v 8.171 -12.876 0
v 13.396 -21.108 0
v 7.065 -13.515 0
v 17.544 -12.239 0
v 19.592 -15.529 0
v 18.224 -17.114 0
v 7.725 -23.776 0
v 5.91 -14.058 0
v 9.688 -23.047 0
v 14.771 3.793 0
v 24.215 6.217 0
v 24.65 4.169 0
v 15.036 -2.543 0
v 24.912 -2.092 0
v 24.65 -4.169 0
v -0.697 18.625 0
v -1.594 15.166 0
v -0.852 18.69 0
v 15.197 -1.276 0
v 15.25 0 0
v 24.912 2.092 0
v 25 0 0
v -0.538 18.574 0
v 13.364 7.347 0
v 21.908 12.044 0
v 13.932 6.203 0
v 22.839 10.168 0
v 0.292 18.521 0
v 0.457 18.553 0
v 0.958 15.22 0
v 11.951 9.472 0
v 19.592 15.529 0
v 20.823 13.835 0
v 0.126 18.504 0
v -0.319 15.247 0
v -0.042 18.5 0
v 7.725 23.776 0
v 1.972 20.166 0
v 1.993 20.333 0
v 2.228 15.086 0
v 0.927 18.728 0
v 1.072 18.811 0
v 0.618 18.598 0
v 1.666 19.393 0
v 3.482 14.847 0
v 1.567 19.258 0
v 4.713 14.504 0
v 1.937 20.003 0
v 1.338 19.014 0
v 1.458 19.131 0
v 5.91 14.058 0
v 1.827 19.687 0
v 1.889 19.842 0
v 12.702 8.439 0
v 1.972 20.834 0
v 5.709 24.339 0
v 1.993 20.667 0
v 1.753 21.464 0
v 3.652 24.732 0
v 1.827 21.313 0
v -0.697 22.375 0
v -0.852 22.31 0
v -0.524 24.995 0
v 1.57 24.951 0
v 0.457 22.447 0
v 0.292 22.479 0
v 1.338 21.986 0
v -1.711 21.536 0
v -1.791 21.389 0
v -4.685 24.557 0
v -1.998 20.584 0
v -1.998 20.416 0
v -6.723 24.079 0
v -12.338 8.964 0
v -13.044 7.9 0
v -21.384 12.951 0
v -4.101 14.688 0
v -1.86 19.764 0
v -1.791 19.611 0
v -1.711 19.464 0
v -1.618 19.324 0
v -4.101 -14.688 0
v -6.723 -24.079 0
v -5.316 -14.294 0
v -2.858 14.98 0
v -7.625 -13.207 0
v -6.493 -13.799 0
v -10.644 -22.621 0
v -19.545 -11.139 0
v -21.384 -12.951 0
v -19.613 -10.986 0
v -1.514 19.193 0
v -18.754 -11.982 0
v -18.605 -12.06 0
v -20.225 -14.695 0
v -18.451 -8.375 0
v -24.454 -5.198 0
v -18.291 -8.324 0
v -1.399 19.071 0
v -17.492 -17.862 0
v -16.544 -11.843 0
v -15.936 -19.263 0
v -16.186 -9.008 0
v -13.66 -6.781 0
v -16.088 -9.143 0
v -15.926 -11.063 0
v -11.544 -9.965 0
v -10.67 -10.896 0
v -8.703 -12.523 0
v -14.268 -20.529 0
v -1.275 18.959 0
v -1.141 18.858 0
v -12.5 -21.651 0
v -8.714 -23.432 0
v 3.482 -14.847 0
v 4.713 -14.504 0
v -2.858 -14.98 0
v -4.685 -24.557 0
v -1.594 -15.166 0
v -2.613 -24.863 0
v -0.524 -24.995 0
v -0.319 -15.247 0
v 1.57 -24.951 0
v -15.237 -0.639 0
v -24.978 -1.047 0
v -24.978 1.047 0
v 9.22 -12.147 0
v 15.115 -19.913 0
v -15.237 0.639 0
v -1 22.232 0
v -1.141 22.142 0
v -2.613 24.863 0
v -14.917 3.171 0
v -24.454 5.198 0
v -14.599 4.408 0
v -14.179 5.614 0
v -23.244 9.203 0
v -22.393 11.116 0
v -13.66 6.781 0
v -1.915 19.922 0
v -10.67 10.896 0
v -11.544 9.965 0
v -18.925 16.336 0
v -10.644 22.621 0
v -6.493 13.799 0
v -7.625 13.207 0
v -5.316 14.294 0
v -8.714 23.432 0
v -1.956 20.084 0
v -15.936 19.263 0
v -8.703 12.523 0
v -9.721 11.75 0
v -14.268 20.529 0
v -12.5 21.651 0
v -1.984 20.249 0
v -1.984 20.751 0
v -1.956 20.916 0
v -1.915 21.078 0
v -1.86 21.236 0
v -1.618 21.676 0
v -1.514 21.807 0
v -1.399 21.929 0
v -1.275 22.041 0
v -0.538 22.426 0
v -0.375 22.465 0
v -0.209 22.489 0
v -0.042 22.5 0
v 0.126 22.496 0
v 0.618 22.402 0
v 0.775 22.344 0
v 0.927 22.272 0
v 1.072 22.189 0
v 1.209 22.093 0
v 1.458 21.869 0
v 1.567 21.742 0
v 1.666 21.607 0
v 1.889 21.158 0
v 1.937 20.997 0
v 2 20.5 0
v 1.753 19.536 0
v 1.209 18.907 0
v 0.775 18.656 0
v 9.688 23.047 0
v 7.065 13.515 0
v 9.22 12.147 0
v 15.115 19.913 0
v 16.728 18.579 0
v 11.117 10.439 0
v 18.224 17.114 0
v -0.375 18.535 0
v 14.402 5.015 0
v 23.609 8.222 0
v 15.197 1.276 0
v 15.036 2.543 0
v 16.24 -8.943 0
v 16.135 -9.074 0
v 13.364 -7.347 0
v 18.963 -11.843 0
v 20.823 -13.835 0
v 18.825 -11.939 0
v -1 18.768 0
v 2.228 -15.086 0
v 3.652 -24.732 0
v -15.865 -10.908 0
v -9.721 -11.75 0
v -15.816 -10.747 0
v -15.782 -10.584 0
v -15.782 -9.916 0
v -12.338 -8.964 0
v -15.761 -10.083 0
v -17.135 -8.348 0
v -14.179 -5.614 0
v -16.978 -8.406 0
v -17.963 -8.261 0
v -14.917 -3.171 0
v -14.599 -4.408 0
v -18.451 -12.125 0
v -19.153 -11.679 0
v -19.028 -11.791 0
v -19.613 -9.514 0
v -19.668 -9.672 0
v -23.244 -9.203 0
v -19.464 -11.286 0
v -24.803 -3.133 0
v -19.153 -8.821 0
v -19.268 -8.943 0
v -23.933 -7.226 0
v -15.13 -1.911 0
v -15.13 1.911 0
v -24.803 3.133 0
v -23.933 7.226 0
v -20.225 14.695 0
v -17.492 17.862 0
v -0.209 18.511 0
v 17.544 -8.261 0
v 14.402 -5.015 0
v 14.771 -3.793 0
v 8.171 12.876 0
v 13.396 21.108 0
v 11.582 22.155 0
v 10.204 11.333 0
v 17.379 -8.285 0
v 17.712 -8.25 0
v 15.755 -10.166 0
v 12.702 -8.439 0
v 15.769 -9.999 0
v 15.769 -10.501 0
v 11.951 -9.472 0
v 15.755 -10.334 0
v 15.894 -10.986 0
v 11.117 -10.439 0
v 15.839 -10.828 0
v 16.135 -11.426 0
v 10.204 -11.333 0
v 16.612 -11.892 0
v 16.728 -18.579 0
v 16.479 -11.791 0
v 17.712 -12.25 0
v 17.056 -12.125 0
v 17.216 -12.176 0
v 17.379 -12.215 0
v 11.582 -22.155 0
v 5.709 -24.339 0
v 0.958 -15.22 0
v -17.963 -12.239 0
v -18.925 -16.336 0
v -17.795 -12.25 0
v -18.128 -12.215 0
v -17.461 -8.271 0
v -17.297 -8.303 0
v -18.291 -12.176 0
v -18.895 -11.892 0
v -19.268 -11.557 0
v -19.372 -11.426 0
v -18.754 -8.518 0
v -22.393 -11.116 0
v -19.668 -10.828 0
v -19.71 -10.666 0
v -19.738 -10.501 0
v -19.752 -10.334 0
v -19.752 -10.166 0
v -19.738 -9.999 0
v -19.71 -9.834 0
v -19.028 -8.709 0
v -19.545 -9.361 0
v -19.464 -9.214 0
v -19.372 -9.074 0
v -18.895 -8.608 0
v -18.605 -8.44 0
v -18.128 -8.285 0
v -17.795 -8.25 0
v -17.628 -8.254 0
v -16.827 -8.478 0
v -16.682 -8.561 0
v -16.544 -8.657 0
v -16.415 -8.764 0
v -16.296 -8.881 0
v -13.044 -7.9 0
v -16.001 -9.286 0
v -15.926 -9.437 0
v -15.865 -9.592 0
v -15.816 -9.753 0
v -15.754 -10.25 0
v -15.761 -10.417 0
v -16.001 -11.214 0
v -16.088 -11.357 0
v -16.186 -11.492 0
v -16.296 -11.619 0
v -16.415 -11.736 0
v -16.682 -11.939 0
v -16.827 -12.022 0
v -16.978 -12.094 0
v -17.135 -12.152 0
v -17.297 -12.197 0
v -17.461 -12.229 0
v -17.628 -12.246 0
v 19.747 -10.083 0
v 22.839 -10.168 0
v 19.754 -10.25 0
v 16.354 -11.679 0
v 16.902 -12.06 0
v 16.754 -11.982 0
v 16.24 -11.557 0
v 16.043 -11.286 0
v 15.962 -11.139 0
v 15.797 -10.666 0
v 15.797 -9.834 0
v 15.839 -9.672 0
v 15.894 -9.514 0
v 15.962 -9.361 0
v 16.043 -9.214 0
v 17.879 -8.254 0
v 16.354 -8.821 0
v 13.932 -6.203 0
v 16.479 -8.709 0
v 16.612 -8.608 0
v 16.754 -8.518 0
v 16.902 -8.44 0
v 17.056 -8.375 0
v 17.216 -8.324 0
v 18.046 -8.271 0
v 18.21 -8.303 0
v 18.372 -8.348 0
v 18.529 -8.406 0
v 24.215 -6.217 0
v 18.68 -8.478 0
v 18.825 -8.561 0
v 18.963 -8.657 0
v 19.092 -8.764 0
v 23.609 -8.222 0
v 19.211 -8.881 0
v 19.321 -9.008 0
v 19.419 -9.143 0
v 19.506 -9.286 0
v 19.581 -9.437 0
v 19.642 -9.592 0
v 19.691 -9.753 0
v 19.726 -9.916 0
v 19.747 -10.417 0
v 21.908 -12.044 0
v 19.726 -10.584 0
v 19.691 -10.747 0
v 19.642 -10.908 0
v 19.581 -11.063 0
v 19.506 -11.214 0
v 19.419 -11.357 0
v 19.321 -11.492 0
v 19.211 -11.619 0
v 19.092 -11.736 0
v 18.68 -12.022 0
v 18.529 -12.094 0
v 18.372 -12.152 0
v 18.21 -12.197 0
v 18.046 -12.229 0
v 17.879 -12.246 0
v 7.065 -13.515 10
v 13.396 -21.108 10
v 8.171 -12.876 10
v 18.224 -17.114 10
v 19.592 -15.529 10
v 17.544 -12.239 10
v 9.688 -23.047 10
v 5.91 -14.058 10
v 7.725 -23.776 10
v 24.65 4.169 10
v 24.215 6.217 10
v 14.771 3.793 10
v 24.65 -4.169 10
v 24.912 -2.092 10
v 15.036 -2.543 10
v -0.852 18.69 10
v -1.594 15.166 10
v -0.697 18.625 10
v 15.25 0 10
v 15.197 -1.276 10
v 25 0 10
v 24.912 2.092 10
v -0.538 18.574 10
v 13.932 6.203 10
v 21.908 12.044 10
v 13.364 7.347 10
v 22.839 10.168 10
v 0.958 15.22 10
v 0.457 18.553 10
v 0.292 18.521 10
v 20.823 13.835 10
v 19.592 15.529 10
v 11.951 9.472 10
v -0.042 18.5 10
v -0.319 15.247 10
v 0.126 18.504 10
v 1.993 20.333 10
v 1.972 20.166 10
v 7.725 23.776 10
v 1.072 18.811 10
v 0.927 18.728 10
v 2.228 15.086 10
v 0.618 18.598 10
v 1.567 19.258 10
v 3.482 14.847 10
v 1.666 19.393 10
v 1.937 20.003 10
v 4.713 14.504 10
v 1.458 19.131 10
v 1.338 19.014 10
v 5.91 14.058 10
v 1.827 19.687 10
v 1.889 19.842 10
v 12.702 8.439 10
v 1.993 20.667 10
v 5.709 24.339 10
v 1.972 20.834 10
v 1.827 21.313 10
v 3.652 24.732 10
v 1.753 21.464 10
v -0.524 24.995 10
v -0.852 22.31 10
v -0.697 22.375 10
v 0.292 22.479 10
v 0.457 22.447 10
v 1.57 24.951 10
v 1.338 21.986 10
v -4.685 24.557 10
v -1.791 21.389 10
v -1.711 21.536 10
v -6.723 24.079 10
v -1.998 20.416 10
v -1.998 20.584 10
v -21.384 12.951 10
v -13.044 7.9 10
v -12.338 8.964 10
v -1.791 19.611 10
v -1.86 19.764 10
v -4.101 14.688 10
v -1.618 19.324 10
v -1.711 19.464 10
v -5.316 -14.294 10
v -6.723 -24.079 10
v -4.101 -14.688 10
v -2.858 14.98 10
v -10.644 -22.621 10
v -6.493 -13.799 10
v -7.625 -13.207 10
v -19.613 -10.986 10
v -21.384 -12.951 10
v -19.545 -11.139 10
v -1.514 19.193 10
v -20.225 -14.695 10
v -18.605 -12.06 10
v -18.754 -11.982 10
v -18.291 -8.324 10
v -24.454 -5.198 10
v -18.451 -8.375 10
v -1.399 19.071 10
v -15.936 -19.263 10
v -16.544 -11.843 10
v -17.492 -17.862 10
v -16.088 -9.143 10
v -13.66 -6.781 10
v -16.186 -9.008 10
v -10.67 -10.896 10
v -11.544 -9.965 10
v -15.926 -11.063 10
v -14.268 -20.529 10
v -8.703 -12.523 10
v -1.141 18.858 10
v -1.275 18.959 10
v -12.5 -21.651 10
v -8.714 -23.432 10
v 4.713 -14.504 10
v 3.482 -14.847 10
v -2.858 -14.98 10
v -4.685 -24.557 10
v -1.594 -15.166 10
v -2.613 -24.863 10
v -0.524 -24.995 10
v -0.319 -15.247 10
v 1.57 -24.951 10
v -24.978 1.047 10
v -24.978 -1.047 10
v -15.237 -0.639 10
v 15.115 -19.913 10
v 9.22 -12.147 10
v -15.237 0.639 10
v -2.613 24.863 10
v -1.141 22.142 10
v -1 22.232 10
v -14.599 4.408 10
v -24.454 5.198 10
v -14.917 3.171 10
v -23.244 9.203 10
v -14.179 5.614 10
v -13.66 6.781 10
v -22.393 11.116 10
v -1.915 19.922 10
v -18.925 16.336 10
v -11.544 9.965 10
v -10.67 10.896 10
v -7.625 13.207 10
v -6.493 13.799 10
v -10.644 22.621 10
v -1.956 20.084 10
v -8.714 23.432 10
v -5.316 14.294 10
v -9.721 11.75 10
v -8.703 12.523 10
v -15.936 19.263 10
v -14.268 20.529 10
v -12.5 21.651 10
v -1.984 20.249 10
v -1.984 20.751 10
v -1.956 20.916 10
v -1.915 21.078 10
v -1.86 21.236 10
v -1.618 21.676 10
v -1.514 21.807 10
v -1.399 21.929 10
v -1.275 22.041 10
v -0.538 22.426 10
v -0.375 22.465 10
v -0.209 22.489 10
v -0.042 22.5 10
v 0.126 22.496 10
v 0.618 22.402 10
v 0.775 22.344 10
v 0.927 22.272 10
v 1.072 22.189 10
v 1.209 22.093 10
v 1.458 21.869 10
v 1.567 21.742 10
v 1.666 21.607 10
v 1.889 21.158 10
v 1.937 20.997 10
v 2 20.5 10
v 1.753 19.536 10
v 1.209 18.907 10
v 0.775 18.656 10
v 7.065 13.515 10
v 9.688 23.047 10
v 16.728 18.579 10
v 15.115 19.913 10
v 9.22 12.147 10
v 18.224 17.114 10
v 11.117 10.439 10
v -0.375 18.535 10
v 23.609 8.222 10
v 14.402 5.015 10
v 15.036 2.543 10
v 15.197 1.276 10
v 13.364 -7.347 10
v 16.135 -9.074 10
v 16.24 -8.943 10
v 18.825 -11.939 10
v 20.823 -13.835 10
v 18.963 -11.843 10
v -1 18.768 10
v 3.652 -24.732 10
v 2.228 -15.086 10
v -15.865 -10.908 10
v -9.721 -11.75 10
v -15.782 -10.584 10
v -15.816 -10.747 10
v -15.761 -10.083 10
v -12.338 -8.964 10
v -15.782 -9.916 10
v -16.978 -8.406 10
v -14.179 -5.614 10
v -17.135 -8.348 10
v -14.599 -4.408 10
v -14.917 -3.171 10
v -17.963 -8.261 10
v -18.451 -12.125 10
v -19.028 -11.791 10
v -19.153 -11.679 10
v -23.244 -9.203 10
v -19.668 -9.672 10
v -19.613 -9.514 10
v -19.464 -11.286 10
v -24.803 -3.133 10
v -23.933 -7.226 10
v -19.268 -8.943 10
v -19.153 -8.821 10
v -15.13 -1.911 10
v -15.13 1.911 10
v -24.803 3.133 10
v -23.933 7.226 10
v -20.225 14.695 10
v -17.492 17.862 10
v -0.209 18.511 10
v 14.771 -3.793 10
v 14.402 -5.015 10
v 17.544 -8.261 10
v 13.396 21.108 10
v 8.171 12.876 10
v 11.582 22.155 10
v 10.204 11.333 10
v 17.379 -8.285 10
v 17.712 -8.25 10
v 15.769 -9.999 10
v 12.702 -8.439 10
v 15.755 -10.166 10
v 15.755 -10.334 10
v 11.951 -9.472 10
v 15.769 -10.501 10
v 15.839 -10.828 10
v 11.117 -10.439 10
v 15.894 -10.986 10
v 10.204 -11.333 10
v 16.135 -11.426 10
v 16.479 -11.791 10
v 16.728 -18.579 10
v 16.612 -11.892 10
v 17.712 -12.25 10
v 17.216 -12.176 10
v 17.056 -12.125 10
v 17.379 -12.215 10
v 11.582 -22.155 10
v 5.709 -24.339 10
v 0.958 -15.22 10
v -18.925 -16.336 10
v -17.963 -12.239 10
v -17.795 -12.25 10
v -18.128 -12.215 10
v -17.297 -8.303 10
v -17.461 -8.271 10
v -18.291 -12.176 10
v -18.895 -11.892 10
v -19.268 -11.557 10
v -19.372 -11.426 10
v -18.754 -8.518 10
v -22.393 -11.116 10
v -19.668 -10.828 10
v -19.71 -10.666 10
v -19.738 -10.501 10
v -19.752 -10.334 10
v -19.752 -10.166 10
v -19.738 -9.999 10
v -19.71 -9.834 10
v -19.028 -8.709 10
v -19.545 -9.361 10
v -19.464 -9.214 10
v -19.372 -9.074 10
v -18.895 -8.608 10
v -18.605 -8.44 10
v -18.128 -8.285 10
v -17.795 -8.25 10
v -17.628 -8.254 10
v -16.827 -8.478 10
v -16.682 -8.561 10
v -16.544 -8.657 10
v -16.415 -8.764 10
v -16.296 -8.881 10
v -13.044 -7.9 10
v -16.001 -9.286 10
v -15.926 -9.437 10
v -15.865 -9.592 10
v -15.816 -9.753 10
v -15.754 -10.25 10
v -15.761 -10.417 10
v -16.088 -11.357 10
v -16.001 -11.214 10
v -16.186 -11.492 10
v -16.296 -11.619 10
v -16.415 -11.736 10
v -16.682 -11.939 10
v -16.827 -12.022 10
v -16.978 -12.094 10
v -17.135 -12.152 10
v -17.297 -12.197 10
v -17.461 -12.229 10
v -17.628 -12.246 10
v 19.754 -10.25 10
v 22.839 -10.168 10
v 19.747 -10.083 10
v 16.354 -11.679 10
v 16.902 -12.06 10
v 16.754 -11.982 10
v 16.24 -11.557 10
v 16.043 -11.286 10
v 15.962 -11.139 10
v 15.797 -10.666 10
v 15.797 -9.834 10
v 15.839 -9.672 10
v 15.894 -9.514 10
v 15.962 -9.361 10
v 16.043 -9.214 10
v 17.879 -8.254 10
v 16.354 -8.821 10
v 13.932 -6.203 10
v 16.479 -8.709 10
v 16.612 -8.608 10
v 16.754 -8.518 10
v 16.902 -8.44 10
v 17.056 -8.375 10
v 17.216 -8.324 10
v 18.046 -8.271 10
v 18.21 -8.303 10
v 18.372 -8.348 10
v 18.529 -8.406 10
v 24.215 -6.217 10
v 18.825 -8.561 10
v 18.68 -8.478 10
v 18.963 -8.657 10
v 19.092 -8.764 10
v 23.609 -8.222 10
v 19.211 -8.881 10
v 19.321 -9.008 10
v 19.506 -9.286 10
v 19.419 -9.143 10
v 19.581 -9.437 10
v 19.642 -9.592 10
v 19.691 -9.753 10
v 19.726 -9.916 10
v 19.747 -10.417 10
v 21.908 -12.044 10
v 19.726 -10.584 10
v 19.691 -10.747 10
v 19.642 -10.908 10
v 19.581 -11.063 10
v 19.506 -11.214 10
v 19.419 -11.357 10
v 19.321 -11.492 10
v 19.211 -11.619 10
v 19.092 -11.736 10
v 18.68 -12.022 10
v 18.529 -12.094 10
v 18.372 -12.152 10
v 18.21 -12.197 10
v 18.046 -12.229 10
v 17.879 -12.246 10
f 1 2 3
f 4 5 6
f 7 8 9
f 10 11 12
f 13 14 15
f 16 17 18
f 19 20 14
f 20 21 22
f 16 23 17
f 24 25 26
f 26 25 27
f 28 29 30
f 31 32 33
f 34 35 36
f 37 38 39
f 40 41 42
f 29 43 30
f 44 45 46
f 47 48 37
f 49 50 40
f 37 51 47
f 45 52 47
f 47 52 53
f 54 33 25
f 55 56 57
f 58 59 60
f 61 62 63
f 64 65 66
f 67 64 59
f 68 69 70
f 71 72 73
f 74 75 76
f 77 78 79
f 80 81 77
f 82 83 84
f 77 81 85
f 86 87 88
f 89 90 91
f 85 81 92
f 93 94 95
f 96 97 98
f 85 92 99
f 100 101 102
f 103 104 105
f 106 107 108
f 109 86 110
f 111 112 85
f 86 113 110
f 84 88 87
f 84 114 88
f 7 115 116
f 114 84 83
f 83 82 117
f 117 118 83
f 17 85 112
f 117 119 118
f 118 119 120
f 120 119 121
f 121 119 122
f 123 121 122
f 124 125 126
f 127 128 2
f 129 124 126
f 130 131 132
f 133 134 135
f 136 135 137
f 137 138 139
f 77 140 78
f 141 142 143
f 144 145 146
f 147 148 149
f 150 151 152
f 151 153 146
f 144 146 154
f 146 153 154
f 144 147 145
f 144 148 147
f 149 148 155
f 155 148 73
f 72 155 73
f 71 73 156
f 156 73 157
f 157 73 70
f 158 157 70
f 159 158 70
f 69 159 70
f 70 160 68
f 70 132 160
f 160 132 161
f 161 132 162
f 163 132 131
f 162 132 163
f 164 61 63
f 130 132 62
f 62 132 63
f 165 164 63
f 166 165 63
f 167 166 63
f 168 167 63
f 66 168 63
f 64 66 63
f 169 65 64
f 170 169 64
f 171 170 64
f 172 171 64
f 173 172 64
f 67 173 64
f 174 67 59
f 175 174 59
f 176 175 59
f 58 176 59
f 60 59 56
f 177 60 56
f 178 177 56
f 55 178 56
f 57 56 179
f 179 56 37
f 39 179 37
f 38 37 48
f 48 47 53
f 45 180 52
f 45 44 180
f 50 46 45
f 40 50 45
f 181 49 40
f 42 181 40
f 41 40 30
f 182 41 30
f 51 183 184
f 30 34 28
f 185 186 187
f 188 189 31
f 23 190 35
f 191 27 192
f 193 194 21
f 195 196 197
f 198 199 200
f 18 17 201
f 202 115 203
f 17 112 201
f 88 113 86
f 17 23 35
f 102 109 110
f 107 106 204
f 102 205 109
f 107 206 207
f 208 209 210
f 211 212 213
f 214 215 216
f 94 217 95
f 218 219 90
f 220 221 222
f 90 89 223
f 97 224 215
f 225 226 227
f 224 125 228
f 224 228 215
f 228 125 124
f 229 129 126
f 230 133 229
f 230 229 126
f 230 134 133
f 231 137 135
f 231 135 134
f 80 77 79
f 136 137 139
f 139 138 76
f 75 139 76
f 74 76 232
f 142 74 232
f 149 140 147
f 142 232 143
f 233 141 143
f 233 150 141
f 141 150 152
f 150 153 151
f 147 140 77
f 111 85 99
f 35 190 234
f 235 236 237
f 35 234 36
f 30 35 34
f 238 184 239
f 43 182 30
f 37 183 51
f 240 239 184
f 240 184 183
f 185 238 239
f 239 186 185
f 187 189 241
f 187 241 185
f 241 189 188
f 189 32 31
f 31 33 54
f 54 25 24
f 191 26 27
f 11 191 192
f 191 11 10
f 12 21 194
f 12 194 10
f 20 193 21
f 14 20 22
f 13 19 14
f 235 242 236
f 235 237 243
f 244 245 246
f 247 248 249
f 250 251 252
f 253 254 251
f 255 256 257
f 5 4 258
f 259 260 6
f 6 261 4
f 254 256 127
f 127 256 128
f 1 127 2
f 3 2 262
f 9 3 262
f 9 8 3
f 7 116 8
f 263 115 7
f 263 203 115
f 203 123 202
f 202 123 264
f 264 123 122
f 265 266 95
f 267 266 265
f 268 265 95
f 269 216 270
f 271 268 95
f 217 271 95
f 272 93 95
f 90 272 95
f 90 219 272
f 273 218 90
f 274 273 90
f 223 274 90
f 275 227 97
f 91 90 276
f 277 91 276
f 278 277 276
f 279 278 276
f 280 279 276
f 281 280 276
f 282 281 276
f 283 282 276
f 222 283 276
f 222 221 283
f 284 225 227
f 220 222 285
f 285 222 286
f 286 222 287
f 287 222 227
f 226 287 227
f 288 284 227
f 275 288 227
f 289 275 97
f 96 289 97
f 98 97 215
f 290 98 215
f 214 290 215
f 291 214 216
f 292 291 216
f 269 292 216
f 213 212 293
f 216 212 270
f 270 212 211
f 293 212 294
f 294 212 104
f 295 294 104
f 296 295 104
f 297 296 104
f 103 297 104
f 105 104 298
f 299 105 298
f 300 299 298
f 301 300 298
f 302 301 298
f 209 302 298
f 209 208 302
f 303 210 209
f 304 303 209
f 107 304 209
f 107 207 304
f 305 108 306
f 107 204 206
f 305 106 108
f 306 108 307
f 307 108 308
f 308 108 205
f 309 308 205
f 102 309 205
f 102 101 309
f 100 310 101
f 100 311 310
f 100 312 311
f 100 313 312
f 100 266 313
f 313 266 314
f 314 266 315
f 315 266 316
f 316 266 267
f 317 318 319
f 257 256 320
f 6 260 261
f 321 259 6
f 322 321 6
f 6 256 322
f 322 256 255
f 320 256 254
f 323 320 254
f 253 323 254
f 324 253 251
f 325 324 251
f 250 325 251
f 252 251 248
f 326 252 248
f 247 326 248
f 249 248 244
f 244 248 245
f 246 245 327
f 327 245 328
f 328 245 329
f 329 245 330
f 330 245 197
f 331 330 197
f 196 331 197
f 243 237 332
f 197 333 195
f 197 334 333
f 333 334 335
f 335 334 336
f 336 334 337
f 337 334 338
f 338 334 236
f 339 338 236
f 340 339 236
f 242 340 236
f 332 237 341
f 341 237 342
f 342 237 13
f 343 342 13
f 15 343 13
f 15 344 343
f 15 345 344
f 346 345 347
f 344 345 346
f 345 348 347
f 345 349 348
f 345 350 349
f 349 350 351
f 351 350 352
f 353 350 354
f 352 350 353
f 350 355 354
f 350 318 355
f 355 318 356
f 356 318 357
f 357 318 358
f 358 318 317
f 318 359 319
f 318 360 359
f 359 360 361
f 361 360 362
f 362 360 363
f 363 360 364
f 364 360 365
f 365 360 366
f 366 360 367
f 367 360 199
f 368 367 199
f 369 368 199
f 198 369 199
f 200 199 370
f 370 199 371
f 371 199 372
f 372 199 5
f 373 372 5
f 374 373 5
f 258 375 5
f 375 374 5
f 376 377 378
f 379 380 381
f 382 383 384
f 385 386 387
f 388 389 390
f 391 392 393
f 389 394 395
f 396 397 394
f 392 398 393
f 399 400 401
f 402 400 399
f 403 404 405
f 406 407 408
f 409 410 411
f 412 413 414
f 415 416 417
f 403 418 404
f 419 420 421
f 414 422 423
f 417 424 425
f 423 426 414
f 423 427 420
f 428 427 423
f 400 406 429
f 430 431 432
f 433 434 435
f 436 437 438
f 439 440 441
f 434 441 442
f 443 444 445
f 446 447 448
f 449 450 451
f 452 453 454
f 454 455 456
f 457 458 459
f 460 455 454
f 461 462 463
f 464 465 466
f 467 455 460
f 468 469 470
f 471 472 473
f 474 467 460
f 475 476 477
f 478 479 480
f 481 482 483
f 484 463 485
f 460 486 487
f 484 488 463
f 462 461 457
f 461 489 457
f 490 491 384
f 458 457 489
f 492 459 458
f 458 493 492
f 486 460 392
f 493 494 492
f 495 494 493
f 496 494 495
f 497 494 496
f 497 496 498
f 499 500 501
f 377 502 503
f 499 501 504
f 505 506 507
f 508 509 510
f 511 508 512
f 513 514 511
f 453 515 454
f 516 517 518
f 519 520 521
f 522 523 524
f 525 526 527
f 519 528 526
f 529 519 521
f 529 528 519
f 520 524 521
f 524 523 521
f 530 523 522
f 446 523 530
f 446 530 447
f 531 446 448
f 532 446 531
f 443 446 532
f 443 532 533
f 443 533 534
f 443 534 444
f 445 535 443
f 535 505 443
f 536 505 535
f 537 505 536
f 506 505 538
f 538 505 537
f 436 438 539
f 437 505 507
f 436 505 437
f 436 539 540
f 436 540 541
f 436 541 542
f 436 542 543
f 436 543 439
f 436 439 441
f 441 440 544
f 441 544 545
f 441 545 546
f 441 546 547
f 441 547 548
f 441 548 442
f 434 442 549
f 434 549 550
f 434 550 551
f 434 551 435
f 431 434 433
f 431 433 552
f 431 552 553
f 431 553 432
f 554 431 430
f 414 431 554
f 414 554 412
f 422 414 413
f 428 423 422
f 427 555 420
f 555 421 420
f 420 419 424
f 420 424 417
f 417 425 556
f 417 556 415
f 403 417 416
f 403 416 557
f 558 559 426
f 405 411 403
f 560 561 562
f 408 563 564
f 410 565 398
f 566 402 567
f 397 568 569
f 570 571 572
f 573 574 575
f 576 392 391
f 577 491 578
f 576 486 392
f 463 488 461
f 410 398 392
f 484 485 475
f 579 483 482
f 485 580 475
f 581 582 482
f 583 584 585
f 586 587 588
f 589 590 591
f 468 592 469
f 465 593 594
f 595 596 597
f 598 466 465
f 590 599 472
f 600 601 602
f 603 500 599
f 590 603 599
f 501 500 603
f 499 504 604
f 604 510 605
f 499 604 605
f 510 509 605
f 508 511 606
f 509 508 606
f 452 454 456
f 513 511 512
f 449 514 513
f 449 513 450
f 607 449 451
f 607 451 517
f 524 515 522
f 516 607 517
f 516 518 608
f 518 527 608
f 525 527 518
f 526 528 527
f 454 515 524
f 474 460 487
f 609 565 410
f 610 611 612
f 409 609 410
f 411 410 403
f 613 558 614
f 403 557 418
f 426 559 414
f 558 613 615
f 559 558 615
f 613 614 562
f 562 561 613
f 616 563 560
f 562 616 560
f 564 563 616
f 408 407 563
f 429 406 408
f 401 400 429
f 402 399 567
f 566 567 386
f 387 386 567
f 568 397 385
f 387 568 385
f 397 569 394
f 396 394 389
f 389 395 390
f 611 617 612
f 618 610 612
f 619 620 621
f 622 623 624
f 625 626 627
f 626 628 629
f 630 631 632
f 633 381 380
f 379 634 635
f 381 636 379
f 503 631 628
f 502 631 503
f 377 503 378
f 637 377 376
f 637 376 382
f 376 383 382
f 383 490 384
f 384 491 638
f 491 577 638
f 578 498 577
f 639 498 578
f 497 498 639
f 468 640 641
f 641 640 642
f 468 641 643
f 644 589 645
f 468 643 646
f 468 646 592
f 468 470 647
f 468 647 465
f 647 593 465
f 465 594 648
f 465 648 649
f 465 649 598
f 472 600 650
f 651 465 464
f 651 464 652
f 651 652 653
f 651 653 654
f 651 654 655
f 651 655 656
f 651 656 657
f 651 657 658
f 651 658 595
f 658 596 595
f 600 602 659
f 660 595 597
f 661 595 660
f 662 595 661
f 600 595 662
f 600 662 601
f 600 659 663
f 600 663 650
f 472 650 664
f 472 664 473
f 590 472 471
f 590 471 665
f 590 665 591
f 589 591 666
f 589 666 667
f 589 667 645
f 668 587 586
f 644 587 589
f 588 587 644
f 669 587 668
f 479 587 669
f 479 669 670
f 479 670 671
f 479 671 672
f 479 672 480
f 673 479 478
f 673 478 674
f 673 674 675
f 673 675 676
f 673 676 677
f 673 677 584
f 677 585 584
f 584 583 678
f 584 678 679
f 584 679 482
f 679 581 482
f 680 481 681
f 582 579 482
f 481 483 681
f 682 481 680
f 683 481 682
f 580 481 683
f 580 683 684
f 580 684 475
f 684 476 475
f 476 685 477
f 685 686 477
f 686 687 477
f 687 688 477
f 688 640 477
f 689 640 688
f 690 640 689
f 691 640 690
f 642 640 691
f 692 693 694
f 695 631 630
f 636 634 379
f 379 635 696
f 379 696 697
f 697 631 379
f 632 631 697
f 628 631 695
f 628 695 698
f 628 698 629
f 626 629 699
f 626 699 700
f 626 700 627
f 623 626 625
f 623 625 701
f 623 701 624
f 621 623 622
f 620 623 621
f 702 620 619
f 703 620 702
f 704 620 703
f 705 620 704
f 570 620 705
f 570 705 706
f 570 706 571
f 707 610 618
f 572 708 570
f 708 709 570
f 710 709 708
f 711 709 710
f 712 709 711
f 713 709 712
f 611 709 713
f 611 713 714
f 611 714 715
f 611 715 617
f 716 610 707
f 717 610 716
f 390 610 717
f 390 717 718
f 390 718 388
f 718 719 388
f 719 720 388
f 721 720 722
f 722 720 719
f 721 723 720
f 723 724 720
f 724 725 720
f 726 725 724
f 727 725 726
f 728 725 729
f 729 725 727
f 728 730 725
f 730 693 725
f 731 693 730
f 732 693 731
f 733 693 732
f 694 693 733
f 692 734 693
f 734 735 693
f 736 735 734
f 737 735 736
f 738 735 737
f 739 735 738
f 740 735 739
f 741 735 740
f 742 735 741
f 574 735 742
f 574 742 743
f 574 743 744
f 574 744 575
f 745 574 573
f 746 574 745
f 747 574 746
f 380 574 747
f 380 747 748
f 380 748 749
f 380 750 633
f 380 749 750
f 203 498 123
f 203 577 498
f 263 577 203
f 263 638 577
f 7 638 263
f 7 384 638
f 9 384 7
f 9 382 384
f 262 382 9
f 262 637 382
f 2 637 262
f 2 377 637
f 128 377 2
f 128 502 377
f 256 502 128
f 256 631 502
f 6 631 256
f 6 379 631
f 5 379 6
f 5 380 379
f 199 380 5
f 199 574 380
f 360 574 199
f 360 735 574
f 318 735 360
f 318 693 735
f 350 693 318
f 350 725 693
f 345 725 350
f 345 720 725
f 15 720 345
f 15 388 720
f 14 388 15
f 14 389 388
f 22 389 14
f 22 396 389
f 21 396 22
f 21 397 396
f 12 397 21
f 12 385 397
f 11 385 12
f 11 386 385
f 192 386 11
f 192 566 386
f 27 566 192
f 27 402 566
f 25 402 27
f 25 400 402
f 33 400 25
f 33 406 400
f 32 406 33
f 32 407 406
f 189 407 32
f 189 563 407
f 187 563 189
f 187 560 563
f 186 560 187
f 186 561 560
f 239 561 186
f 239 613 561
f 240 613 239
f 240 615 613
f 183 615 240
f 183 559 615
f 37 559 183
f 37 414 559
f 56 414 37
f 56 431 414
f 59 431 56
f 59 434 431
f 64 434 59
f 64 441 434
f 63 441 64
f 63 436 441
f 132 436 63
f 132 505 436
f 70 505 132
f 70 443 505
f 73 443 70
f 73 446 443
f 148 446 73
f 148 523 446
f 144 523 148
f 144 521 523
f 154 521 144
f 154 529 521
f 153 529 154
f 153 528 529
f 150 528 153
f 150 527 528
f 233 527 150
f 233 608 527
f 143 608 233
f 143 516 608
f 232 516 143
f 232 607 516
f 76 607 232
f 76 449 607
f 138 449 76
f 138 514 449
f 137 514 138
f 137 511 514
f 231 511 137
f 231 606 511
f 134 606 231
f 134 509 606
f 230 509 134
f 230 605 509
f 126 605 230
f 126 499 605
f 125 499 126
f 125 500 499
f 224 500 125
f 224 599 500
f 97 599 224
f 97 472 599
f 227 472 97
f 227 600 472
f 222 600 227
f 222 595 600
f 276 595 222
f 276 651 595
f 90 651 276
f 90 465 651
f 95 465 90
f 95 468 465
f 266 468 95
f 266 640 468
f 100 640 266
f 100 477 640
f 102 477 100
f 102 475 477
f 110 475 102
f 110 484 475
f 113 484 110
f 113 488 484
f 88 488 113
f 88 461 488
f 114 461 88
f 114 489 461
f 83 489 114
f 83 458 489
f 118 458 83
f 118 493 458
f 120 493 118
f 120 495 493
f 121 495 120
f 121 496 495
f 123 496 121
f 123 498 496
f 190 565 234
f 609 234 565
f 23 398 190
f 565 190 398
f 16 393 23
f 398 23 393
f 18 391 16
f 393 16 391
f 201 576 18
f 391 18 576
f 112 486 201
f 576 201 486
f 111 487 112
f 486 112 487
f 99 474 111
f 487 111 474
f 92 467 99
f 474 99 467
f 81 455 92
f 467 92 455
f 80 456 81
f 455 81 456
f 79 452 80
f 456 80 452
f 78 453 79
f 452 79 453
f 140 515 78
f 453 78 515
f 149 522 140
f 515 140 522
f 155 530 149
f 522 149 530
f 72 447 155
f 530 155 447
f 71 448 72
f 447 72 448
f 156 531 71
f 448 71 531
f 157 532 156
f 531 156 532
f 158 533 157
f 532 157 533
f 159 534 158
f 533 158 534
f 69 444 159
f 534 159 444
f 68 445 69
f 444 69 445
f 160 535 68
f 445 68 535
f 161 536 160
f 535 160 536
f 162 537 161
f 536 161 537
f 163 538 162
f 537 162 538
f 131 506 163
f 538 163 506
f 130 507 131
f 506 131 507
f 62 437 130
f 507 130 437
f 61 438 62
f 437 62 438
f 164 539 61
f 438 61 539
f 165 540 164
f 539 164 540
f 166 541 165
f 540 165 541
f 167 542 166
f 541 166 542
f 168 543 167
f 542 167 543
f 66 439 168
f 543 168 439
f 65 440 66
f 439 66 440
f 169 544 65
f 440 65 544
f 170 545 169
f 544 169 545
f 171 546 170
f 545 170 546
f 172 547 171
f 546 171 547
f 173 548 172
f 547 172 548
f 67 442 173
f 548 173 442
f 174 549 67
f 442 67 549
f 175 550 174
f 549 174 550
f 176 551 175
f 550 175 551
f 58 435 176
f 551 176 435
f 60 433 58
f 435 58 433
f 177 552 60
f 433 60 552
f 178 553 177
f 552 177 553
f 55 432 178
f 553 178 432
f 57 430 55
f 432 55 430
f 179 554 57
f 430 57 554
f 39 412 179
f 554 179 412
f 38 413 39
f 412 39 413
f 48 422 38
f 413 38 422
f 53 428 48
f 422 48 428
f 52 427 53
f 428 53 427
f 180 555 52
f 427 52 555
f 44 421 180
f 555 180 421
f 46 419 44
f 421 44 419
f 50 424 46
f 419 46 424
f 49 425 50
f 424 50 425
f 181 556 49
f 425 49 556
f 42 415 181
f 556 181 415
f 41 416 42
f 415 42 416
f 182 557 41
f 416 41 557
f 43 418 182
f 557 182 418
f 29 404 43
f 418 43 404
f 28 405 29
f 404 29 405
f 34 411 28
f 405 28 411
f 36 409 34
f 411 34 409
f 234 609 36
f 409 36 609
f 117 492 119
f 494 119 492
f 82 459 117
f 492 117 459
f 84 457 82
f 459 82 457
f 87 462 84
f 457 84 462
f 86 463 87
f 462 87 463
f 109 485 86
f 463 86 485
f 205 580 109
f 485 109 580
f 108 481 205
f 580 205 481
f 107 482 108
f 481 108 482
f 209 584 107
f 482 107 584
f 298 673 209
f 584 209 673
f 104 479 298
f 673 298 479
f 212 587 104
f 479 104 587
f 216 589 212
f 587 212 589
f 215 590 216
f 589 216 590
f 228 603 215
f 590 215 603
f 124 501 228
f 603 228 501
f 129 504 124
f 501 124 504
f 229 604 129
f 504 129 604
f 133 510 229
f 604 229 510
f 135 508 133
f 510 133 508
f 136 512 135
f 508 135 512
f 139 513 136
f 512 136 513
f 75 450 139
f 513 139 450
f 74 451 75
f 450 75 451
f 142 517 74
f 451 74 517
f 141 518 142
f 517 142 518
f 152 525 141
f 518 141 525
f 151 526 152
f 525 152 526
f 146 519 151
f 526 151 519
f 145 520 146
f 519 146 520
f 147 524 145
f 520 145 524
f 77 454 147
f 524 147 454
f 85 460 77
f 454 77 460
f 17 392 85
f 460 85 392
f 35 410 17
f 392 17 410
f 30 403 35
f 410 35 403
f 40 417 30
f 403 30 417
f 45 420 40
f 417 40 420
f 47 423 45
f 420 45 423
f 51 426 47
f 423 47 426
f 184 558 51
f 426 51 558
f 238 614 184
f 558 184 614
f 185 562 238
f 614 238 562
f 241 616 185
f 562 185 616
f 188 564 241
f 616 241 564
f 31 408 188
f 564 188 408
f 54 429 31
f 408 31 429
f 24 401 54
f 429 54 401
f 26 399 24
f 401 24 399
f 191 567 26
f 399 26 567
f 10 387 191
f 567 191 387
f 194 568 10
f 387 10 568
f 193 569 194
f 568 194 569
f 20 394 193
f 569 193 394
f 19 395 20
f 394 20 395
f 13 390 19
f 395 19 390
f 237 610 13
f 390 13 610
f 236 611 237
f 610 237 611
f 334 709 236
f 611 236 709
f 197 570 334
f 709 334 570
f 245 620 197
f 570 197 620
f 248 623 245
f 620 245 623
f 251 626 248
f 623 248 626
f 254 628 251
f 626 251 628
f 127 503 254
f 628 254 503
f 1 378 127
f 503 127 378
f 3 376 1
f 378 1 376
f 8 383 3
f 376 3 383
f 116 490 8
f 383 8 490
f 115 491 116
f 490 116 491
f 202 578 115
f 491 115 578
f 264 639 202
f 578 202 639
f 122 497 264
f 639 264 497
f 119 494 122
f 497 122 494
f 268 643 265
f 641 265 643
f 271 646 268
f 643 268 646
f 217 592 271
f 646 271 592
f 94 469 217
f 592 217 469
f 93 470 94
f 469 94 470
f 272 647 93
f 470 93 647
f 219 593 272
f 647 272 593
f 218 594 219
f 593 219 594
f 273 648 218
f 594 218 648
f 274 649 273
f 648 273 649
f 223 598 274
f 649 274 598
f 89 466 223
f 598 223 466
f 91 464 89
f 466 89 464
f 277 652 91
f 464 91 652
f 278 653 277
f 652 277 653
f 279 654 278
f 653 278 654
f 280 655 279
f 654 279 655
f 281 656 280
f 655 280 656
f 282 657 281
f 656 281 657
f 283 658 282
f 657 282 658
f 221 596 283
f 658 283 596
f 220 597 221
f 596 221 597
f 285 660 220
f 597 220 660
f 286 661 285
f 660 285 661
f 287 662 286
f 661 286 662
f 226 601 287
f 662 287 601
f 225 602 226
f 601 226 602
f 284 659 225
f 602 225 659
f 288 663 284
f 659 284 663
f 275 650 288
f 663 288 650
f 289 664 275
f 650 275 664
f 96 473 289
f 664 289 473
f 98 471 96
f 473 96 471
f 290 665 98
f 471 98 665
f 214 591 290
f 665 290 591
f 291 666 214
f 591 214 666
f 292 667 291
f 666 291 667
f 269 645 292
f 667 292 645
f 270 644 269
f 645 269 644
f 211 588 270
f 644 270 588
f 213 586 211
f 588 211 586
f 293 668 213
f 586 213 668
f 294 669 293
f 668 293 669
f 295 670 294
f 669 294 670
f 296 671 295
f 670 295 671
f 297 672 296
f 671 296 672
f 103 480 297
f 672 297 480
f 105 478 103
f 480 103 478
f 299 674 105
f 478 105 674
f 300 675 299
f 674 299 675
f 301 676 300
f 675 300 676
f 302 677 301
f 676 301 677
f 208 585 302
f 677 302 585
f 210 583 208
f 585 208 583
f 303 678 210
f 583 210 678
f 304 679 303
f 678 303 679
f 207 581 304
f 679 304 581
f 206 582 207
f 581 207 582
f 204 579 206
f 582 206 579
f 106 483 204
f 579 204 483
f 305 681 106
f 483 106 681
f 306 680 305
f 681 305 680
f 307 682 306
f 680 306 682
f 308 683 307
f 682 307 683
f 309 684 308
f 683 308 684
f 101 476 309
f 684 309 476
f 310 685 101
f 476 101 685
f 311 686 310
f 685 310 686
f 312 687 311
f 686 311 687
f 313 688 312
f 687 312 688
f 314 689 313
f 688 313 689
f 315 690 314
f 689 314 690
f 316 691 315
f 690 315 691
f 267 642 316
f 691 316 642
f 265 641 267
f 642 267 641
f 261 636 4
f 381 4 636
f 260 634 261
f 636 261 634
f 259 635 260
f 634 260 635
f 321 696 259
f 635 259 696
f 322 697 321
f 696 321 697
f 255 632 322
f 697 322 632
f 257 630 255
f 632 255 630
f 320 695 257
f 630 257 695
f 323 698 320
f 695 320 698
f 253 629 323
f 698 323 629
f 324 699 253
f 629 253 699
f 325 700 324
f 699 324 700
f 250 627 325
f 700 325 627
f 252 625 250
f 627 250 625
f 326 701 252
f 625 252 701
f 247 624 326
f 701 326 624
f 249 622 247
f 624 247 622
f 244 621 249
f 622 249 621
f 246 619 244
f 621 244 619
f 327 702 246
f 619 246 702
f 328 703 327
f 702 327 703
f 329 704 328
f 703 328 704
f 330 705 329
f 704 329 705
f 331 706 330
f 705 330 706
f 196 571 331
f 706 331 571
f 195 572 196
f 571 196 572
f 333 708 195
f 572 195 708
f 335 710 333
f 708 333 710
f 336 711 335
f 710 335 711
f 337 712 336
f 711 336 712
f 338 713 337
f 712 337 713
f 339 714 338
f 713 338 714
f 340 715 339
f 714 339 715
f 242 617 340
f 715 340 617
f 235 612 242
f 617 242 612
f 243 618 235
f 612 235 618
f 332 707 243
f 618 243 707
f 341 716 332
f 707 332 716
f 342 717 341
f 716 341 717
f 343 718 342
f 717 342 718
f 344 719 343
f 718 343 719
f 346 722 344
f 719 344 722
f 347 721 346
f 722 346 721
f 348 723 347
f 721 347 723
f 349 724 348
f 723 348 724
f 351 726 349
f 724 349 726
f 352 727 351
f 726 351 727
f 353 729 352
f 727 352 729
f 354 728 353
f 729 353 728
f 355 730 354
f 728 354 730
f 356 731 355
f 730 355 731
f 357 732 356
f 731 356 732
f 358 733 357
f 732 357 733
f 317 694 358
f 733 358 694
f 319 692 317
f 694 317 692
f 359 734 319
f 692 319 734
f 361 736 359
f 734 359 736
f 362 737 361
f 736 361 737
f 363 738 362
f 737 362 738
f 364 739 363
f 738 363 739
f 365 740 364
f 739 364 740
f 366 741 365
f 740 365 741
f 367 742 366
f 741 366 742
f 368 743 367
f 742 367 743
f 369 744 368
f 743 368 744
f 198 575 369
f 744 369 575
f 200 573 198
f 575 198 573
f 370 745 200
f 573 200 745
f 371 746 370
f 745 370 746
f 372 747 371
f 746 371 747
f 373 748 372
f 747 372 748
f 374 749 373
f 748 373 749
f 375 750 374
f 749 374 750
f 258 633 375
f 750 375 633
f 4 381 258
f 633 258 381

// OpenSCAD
$fn = 75;


linear_extrude(height=10)
difference() {
    circle(d=16+14+20);
    circle(d=16.5+14);
    for (i = [0, 1, 2]) {
        rotate([0, 0, 120 * i])
        translate([0, (16 + 14 + 20)/2 - 4.5])
        circle(d=4);
    }
}
